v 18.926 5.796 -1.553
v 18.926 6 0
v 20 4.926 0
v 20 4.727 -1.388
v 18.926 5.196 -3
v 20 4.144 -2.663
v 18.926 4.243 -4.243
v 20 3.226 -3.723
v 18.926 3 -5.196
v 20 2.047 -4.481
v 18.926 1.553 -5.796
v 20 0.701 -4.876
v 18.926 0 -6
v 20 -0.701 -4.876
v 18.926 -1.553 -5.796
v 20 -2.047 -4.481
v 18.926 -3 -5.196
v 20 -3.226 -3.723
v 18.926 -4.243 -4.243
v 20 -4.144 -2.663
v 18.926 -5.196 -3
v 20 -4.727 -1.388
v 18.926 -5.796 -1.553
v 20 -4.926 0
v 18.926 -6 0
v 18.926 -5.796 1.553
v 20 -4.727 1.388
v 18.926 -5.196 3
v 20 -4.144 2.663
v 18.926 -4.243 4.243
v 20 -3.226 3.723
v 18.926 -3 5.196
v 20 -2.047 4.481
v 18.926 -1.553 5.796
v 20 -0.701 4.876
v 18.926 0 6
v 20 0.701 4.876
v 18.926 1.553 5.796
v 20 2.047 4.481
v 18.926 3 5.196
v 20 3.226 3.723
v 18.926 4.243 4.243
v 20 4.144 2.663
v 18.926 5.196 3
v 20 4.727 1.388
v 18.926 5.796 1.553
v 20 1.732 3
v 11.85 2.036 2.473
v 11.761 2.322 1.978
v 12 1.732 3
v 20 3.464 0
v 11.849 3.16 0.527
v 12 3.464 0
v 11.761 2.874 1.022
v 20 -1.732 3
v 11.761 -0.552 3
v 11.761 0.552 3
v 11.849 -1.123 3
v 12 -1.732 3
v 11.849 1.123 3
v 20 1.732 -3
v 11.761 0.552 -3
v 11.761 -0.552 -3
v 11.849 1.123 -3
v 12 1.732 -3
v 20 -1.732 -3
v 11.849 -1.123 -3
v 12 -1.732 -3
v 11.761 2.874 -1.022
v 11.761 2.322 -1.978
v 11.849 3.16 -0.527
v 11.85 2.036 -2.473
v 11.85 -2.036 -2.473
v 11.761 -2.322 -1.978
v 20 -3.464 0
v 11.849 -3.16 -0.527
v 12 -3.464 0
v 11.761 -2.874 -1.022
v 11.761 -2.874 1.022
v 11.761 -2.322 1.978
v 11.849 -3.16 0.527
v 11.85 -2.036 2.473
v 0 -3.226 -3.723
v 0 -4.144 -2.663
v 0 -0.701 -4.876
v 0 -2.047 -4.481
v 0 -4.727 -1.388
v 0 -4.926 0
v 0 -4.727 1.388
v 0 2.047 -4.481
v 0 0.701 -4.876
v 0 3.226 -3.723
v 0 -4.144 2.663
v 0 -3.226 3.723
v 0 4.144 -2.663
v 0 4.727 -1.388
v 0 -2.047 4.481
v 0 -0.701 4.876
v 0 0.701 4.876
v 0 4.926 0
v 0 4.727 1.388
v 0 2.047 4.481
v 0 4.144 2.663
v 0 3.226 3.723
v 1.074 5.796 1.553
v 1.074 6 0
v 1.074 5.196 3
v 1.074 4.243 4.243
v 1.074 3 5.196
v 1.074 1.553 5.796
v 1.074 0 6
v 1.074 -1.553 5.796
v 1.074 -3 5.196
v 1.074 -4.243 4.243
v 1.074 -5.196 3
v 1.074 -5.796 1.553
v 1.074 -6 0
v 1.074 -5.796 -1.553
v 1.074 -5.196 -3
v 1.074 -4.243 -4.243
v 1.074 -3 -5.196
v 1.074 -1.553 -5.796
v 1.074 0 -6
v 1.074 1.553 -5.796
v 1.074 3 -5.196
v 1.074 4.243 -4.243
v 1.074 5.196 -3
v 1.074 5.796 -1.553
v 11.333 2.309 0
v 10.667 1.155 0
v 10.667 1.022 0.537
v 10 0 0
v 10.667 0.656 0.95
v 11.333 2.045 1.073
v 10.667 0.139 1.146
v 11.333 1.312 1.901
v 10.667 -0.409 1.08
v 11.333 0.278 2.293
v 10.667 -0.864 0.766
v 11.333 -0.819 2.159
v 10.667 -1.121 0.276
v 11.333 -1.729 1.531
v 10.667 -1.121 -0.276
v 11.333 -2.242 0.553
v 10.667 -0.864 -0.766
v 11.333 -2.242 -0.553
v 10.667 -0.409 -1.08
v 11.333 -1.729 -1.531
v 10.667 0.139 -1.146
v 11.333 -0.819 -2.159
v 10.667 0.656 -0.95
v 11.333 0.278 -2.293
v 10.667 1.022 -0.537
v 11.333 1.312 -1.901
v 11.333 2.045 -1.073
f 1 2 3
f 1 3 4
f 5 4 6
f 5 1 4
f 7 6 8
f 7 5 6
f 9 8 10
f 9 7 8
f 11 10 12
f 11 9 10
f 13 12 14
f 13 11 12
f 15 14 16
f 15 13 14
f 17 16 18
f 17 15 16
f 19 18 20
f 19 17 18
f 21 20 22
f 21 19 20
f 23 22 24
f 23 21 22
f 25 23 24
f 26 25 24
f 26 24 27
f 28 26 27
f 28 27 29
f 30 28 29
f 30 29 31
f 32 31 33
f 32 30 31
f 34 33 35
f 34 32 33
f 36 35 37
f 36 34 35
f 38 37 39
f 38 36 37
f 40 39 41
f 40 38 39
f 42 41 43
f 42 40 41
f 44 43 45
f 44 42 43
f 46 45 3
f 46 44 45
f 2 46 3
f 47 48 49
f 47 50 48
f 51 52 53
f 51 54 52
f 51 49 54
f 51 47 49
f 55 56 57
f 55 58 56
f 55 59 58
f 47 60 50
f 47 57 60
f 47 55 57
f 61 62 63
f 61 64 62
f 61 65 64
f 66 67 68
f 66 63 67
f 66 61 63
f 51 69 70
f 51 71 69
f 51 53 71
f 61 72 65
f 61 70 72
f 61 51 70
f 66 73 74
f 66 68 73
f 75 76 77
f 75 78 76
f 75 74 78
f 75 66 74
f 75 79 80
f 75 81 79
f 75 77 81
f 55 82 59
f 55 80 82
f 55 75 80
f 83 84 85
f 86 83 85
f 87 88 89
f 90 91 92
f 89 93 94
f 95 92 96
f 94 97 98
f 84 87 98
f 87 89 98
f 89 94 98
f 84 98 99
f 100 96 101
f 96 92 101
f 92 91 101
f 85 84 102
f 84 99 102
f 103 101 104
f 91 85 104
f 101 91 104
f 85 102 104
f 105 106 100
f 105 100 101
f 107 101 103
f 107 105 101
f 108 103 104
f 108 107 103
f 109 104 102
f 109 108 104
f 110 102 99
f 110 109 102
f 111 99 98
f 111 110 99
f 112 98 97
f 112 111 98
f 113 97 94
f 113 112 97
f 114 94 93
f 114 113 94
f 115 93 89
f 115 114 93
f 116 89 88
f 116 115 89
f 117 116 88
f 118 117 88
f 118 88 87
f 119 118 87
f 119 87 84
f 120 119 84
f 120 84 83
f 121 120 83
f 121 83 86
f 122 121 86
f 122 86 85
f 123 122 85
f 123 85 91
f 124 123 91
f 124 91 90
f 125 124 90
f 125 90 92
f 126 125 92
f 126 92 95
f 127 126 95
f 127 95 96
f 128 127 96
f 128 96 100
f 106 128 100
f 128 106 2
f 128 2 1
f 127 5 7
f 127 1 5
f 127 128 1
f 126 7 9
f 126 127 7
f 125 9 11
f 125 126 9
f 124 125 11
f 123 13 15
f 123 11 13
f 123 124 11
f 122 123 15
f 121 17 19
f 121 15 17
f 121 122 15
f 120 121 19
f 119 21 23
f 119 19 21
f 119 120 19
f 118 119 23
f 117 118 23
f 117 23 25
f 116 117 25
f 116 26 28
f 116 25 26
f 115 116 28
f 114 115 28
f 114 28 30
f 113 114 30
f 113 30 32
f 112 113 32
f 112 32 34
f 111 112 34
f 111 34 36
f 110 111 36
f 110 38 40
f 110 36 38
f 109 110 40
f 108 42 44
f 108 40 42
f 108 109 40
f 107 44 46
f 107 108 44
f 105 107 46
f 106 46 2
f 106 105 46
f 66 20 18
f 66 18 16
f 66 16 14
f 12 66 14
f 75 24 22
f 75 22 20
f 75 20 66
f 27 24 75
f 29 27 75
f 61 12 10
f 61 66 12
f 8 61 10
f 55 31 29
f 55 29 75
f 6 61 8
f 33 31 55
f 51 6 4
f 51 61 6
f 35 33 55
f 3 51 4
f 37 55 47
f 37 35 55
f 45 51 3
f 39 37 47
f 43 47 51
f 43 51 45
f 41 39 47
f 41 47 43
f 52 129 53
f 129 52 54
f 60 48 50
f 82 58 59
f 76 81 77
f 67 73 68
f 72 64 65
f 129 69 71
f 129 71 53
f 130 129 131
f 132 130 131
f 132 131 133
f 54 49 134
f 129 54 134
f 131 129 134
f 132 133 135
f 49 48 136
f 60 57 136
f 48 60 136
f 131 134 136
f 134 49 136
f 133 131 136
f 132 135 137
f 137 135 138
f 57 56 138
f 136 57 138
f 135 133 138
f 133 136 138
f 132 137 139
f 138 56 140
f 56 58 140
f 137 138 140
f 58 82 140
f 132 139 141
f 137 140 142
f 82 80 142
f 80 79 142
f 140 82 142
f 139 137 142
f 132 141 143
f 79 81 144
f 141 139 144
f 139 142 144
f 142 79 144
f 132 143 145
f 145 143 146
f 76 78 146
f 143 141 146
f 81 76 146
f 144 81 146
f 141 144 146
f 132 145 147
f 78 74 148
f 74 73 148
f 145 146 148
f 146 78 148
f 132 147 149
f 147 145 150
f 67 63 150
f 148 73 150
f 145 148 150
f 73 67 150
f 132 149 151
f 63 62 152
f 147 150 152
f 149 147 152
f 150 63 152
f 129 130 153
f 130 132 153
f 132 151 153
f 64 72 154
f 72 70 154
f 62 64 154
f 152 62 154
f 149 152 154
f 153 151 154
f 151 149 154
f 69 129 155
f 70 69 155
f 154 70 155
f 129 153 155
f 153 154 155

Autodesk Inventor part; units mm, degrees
ref_plane "YZ Plane" through (0, 0, 0) normal (1, 0, 0) x (0, 1, 0)
ref_plane "XZ Plane" through (0, 0, 0) normal (0, 1, 0) x (-1, 0, 0)
sketch "Sketch1" plane through (0, 0, 0) normal (0, 0, 1) x (1, 0, 0)
  line L0 (0, 0) -> (10, 0)
  line L1 (20, 3.4641) -> (20, 6)
  line L2 (20, 6) -> (0, 6)
  line L3 (20, 3.4641) -> (12, 3.4641)
  line L4 (12, 3.4641) -> (10, 0)
  line L5 (0, -1.2) -> (0, 7.2) projected
  line L6 (0, 6) -> (0, 0)
  dimension "d0" = 8
  dimension "d1" = 60
  dimension "d2" = 12
  dimension "d3" = 6.9282
  dimension "d5" = 20
revolve "Body" add sketch "Sketch1" angle 360 about axis through (0, 0, 0) along (1, 0, 0)
sketch "Sketch2" plane through (20, 0, 0) normal (1, 0, 0) x (0, 1, 0)
  circle A0 centre (0, 0) radius 3.4641 projected
  line L0 (-1.7321, 3) -> (1.7321, 3)
  line L1 (1.7321, 3) -> (3.4641, 0)
  line L2 (3.4641, 0) -> (1.7321, -3)
  line L3 (1.7321, -3) -> (-1.7321, -3)
  line L4 (-1.7321, -3) -> (-3.4641, 0)
  line L5 (-3.4641, 0) -> (-1.7321, 3)
  point P0 (0, 0)
  point P1 (0, 0)
extrude "Slot" add sketch "Sketch2" against normal up to next contours L1 A0 | A0 L2 | L0 A0 | A0 L3 | L5 A0 | A0 L4
thread "Thread" size "M12x1.75" class "6g" standard "ISO Metric profile" length 20
chamfer "Chamfer1" distance 1.0735 angle 45 1 edges at (20, -6, 0) measured on face at (13.3333, 5.9805, -0.4828)
chamfer "Chamfer2" distance 1.0735 angle 45 1 edges at (0, -6, 0) measured on face at (6.3088, 5.9805, -0.4828)
ref_plane "Work Plane1" through (10, 0, 0) normal (0, 0, 1) x (1, 0, 0)
equation "\"d8\" = NLG"
equation "\"d10\" = -0.5 * GD1 + 0.5 * NND"
equation "\"d11\" = FAWI"
equation "\"d34\" = -0.5 * GD1 + 0.5 * NND"
equation "\"d12\" = -0.5 * GD1 + 0.5 * NND"
equation "\"d13\" = FAWI"
equation "\"d35\" = -0.5 * GD1 + 0.5 * NND"
equation "\"d0\" = INTI"
equation "\"d2\" = NND"
equation "\"d3\" = 1.1547 * SW"
equation "\"d5\" = NLG"
equation "\"NND\" = 12"
equation "\"NLG\" = 20"
equation "\"INTI\" = 8"
equation "\"FAWI\" = 45deg"
equation "\"SW\" = 6"
equation "\"GD1\" = THREADDIA - 1.2269 * PTC"
equation "\"SPD\" = 8.5"
equation "\"GUL\" = 0.61345 * PTC"
equation "\"TOA\" = 30deg"
equation "\"THREADDIA\" = 12"
equation "\"PTC\" = 1.75"
equation "\"FAWI1\" = 45deg"
equation "\"GAL\" = 0.61345 * PTC"
equation "\"E0\" = 1.155 * SW"
properties part number "DIN 913 - M12 x 20" material "Steel, Mild"
